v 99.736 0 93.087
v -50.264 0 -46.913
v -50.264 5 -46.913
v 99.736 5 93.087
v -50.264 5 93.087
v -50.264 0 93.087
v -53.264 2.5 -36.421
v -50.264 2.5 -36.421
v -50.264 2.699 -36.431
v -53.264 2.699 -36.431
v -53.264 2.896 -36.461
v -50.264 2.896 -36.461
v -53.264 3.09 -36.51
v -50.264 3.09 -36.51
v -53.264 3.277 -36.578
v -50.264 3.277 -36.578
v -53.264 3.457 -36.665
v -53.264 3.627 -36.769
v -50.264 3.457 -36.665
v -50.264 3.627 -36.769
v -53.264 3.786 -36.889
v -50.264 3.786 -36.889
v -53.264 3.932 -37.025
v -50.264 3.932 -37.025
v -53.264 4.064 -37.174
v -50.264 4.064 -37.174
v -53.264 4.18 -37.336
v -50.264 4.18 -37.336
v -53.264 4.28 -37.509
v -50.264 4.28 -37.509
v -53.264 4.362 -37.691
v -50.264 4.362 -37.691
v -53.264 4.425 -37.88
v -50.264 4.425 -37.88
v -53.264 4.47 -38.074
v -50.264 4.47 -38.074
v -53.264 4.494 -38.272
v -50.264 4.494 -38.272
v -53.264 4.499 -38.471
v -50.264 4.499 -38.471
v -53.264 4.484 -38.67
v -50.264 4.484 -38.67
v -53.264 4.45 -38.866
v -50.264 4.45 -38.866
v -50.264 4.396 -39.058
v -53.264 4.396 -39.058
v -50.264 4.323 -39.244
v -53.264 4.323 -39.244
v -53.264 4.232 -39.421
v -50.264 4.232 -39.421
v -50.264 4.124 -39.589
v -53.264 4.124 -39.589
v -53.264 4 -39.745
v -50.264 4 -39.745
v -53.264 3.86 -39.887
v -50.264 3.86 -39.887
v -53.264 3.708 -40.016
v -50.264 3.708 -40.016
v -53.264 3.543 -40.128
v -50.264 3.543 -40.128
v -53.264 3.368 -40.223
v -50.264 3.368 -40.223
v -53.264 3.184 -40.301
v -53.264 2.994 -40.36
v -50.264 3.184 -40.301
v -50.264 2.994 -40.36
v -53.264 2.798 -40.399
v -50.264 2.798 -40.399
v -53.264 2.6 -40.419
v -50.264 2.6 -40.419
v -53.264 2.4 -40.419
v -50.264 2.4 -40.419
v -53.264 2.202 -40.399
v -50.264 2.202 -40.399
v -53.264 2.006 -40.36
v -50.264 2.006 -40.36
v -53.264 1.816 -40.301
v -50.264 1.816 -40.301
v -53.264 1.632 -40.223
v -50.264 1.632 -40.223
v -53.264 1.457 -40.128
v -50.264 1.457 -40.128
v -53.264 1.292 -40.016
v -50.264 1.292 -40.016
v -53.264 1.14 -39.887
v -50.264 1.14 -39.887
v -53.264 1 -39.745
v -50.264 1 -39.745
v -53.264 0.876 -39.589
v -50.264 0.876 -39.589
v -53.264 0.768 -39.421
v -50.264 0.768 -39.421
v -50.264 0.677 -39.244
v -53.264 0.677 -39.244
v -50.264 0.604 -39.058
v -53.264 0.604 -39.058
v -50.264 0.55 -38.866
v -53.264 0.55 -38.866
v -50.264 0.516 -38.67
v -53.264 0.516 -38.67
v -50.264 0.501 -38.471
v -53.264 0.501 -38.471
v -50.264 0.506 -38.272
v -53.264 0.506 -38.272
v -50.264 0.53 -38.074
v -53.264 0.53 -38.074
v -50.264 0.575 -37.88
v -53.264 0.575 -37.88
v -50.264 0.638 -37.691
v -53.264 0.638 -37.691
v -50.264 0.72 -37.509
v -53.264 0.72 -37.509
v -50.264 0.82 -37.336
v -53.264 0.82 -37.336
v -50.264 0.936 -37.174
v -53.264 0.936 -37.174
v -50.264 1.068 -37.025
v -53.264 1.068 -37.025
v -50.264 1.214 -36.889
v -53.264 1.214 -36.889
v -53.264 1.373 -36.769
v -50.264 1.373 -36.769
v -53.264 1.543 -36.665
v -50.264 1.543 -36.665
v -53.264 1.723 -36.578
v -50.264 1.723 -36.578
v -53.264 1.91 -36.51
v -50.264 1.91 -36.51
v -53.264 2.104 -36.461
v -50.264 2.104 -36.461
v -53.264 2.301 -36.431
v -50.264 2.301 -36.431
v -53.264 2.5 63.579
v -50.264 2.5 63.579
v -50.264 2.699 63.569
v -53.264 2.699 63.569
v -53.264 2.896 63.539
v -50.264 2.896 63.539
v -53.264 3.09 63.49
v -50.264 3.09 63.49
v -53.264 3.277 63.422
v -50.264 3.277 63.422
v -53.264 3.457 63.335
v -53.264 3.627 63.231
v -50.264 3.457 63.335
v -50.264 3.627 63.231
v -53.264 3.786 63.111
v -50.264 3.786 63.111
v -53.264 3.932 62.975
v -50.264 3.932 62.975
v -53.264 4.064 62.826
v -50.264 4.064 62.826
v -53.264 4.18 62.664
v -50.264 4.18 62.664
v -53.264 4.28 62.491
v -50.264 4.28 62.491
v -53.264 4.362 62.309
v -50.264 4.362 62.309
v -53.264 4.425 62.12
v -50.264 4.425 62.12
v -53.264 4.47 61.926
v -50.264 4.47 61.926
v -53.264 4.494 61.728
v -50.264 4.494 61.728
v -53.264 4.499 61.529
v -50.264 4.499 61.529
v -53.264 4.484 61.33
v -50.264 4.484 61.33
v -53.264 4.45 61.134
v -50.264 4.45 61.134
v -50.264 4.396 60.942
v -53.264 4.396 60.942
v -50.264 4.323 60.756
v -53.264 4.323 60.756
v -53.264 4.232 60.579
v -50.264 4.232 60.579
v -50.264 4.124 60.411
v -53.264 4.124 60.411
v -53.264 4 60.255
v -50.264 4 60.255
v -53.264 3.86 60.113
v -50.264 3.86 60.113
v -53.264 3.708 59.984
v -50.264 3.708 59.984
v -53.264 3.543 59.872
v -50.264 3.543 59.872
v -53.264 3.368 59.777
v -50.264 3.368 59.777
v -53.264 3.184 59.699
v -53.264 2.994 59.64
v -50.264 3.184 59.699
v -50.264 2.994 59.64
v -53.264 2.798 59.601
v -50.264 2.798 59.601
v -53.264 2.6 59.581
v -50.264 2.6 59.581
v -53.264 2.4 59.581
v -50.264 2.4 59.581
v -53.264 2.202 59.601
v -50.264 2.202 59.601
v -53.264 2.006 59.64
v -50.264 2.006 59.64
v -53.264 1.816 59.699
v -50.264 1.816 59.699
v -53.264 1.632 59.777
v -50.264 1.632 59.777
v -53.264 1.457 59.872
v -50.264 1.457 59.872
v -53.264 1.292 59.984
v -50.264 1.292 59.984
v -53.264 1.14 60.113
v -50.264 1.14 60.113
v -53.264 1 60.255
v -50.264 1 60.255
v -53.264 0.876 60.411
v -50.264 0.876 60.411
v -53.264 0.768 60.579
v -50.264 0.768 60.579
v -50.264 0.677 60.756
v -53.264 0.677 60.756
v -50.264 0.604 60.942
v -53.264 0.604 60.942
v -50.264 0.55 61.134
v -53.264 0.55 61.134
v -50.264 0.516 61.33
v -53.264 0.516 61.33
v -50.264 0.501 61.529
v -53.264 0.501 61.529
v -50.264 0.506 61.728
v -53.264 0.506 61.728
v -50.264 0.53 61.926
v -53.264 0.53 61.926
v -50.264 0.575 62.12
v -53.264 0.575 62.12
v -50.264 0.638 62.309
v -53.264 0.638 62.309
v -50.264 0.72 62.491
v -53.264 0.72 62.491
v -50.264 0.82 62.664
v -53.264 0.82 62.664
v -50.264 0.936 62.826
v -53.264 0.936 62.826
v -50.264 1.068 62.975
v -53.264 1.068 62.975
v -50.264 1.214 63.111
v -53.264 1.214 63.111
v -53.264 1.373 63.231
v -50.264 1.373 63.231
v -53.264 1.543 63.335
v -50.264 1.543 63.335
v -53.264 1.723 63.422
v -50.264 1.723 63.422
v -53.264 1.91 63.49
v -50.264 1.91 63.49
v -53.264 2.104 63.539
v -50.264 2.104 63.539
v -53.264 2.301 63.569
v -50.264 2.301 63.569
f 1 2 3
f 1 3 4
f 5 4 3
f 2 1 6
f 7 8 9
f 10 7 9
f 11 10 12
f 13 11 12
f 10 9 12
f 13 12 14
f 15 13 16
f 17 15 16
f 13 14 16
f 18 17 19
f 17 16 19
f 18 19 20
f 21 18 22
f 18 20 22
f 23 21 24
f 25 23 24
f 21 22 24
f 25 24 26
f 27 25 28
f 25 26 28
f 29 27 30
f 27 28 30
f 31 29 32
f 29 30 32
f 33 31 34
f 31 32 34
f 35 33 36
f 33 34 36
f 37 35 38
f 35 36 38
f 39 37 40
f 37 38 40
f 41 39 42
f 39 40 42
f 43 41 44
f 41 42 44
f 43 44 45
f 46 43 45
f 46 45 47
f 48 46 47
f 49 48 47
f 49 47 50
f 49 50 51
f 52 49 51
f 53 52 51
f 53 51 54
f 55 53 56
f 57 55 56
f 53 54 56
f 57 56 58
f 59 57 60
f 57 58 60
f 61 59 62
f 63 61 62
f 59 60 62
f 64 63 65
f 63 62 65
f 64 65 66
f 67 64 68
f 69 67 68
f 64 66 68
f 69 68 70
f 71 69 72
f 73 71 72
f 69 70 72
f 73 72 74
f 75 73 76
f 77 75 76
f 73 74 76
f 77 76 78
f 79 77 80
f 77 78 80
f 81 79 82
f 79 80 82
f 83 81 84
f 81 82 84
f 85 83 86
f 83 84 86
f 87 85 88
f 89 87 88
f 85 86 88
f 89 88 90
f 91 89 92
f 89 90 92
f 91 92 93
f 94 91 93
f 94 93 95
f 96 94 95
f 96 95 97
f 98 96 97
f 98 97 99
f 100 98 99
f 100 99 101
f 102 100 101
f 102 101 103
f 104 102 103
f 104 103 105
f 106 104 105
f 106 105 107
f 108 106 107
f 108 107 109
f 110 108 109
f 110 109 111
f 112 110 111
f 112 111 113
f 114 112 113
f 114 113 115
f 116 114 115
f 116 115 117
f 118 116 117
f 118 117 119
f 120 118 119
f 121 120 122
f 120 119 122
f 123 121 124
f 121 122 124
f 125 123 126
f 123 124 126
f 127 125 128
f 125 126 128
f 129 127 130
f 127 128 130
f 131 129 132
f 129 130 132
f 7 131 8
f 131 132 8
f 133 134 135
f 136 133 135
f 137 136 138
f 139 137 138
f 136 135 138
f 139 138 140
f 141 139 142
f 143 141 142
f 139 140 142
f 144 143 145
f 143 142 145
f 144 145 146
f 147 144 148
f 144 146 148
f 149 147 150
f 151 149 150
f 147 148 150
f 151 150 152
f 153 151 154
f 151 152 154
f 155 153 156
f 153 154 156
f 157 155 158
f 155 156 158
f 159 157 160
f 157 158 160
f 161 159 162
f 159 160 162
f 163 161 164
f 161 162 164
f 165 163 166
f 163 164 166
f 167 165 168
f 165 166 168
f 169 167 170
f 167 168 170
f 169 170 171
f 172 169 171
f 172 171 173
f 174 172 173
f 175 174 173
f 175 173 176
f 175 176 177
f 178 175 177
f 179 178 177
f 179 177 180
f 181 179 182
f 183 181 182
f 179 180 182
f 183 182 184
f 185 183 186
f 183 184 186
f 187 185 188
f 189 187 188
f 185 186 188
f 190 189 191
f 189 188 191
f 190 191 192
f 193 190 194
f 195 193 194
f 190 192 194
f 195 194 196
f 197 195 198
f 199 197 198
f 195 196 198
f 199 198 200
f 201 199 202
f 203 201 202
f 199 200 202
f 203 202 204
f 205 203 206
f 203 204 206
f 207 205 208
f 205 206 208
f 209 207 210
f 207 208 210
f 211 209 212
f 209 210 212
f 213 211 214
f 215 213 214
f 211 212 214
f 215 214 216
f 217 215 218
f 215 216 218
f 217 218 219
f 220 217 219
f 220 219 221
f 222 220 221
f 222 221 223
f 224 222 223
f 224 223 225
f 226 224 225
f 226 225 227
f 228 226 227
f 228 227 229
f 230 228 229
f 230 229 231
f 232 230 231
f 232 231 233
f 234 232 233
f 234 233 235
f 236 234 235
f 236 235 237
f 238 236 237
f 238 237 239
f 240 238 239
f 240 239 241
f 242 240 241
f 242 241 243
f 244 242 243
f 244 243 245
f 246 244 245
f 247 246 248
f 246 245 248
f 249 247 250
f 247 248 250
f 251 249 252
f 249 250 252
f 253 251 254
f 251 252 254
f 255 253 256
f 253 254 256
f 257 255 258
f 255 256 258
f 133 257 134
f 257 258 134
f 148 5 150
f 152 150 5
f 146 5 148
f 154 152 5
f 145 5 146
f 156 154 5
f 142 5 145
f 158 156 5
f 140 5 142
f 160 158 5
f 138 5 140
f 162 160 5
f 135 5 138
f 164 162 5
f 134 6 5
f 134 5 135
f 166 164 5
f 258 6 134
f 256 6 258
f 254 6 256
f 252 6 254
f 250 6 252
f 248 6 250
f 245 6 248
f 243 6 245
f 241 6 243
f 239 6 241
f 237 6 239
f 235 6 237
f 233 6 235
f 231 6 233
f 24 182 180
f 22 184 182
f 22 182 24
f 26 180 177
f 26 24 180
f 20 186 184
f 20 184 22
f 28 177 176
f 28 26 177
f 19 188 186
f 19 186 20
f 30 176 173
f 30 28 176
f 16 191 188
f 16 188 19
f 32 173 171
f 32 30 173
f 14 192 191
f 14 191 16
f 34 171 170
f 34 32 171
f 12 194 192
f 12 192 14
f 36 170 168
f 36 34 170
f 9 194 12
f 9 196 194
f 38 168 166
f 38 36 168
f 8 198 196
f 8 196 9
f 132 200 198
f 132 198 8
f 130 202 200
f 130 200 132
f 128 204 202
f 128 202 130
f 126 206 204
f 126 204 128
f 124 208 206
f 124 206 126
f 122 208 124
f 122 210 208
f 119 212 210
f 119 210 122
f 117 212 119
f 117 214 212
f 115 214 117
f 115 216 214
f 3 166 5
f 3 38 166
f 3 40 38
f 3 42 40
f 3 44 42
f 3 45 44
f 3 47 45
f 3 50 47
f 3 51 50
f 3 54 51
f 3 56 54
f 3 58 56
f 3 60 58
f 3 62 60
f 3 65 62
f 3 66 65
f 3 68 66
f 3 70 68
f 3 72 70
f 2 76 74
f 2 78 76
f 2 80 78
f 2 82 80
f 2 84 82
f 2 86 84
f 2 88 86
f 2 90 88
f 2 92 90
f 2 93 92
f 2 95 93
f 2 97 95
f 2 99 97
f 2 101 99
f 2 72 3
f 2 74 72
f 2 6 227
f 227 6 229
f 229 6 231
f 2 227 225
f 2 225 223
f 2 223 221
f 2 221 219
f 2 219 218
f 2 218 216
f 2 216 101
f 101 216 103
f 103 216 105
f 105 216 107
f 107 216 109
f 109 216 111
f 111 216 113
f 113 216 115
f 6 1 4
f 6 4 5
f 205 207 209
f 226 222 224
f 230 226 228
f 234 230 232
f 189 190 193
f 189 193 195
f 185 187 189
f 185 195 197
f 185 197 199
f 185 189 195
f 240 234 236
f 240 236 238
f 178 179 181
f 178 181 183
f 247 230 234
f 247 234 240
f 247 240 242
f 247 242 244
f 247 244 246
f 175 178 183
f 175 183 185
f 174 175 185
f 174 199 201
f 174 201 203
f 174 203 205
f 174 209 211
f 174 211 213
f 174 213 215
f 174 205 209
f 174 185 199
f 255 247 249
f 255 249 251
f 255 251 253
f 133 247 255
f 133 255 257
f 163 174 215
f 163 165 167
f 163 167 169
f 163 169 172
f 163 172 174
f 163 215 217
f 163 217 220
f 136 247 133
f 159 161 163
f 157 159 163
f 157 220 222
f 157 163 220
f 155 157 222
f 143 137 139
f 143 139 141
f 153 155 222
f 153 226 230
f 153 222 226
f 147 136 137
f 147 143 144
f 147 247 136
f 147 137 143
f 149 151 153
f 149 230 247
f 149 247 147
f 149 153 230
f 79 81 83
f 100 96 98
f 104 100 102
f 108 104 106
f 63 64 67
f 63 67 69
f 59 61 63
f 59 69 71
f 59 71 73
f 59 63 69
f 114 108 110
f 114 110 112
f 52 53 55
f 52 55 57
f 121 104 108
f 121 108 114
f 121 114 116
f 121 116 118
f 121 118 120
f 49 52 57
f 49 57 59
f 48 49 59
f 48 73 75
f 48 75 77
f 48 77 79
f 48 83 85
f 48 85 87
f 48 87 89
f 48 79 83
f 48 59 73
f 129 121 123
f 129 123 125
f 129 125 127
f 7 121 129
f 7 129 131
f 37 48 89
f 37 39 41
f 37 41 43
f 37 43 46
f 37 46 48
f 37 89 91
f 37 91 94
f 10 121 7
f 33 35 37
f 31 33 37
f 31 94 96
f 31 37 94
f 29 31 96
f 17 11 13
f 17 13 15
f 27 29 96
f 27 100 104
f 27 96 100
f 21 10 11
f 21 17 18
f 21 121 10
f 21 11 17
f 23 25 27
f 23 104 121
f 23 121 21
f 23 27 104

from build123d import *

# Parameters (mm, degrees)
BOSS_EXTRUDE1_DEPTH = 5
SKETCH2_R           = 2
BOSS_EXTRUDE2_DEPTH = 3


with BuildPart() as part:
    # Sketch1 → Boss-Extrude1 (new body)
    with BuildSketch(Plane(origin=(0, 0, 0), x_dir=(1, 0, 0), z_dir=(0, 1, 0))):
        Polygon((-50.263774427, 46.912856132), (99.736225573, -93.087143868), (-50.263774427, -93.087143868), align=None)
    extrude(amount=BOSS_EXTRUDE1_DEPTH)

    # Sketch2 → Boss-Extrude2 (add)
    with BuildSketch(Plane.ZY.offset(50.263774427)):
        with Locations((-38.421386897, 2.5)):
            Circle(SKETCH2_R)
        with Locations((61.578613103, 2.5)):
            Circle(SKETCH2_R)
    extrude(amount=BOSS_EXTRUDE2_DEPTH)


solid = part.part
